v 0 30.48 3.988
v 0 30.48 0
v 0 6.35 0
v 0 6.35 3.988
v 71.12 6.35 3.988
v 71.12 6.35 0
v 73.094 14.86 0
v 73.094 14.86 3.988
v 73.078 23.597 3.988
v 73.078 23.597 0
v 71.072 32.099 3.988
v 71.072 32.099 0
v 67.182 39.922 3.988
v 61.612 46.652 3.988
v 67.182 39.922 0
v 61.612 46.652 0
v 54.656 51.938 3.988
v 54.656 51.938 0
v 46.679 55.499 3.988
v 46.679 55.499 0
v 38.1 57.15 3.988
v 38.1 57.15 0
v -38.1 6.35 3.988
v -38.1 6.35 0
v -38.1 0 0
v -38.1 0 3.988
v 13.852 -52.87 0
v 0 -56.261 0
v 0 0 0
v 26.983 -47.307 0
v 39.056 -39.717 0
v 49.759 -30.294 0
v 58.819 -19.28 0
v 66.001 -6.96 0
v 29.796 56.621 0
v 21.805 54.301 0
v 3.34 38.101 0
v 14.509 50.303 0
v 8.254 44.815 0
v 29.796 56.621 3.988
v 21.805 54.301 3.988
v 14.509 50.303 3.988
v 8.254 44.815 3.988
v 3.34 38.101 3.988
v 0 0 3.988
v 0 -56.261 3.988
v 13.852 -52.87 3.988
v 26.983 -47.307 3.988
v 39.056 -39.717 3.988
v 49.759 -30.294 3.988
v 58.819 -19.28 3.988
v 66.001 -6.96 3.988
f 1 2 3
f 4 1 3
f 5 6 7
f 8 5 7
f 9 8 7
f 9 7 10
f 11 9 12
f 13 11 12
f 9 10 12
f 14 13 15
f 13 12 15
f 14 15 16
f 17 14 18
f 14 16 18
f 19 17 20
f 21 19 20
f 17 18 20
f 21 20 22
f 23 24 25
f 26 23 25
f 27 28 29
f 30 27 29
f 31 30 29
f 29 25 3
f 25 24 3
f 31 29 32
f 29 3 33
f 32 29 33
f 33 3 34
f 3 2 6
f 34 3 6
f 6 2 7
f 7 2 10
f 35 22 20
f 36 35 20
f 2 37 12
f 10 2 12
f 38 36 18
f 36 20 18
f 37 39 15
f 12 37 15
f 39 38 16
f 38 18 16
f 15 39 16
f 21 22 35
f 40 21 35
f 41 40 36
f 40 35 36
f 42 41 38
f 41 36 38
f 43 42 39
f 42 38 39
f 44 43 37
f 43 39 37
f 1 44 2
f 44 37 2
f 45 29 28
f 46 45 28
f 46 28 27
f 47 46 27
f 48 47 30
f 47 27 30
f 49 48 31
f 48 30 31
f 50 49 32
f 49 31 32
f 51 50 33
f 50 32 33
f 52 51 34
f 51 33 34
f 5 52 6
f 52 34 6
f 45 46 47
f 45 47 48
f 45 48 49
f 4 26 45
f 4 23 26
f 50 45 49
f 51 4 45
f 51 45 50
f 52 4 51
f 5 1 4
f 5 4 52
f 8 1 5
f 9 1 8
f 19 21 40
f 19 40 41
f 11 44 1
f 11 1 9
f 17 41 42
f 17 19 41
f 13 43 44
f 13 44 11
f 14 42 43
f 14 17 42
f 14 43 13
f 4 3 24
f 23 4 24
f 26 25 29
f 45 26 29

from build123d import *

# Parameters (mm, degrees)
F1_DEPTH = 3.9878


with BuildPart() as f1:
    # F0 (on Top) → F1 (new body)
    with BuildSketch(Plane.XY):
        with BuildLine():
            Line((-38.1, 0), (0, 0))
            Line((0, 0), (0, -56.261))
            ThreePointArc((0, -56.261), (44.596761, -35.22038), (71.12, 6.35))
            ThreePointArc((71.12, 6.35), (67.181938, 39.92176), (38.1, 57.15))
            ThreePointArc((38.1, 57.15), (14.508681, 50.302599), (0, 30.48))
            Line((0, 30.48), (0, 6.35))
            Line((0, 6.35), (-38.1, 6.35))
            Line((-38.1, 6.35), (-38.1, 0))
        make_face()
    extrude(amount=F1_DEPTH)


solid = f1.part
